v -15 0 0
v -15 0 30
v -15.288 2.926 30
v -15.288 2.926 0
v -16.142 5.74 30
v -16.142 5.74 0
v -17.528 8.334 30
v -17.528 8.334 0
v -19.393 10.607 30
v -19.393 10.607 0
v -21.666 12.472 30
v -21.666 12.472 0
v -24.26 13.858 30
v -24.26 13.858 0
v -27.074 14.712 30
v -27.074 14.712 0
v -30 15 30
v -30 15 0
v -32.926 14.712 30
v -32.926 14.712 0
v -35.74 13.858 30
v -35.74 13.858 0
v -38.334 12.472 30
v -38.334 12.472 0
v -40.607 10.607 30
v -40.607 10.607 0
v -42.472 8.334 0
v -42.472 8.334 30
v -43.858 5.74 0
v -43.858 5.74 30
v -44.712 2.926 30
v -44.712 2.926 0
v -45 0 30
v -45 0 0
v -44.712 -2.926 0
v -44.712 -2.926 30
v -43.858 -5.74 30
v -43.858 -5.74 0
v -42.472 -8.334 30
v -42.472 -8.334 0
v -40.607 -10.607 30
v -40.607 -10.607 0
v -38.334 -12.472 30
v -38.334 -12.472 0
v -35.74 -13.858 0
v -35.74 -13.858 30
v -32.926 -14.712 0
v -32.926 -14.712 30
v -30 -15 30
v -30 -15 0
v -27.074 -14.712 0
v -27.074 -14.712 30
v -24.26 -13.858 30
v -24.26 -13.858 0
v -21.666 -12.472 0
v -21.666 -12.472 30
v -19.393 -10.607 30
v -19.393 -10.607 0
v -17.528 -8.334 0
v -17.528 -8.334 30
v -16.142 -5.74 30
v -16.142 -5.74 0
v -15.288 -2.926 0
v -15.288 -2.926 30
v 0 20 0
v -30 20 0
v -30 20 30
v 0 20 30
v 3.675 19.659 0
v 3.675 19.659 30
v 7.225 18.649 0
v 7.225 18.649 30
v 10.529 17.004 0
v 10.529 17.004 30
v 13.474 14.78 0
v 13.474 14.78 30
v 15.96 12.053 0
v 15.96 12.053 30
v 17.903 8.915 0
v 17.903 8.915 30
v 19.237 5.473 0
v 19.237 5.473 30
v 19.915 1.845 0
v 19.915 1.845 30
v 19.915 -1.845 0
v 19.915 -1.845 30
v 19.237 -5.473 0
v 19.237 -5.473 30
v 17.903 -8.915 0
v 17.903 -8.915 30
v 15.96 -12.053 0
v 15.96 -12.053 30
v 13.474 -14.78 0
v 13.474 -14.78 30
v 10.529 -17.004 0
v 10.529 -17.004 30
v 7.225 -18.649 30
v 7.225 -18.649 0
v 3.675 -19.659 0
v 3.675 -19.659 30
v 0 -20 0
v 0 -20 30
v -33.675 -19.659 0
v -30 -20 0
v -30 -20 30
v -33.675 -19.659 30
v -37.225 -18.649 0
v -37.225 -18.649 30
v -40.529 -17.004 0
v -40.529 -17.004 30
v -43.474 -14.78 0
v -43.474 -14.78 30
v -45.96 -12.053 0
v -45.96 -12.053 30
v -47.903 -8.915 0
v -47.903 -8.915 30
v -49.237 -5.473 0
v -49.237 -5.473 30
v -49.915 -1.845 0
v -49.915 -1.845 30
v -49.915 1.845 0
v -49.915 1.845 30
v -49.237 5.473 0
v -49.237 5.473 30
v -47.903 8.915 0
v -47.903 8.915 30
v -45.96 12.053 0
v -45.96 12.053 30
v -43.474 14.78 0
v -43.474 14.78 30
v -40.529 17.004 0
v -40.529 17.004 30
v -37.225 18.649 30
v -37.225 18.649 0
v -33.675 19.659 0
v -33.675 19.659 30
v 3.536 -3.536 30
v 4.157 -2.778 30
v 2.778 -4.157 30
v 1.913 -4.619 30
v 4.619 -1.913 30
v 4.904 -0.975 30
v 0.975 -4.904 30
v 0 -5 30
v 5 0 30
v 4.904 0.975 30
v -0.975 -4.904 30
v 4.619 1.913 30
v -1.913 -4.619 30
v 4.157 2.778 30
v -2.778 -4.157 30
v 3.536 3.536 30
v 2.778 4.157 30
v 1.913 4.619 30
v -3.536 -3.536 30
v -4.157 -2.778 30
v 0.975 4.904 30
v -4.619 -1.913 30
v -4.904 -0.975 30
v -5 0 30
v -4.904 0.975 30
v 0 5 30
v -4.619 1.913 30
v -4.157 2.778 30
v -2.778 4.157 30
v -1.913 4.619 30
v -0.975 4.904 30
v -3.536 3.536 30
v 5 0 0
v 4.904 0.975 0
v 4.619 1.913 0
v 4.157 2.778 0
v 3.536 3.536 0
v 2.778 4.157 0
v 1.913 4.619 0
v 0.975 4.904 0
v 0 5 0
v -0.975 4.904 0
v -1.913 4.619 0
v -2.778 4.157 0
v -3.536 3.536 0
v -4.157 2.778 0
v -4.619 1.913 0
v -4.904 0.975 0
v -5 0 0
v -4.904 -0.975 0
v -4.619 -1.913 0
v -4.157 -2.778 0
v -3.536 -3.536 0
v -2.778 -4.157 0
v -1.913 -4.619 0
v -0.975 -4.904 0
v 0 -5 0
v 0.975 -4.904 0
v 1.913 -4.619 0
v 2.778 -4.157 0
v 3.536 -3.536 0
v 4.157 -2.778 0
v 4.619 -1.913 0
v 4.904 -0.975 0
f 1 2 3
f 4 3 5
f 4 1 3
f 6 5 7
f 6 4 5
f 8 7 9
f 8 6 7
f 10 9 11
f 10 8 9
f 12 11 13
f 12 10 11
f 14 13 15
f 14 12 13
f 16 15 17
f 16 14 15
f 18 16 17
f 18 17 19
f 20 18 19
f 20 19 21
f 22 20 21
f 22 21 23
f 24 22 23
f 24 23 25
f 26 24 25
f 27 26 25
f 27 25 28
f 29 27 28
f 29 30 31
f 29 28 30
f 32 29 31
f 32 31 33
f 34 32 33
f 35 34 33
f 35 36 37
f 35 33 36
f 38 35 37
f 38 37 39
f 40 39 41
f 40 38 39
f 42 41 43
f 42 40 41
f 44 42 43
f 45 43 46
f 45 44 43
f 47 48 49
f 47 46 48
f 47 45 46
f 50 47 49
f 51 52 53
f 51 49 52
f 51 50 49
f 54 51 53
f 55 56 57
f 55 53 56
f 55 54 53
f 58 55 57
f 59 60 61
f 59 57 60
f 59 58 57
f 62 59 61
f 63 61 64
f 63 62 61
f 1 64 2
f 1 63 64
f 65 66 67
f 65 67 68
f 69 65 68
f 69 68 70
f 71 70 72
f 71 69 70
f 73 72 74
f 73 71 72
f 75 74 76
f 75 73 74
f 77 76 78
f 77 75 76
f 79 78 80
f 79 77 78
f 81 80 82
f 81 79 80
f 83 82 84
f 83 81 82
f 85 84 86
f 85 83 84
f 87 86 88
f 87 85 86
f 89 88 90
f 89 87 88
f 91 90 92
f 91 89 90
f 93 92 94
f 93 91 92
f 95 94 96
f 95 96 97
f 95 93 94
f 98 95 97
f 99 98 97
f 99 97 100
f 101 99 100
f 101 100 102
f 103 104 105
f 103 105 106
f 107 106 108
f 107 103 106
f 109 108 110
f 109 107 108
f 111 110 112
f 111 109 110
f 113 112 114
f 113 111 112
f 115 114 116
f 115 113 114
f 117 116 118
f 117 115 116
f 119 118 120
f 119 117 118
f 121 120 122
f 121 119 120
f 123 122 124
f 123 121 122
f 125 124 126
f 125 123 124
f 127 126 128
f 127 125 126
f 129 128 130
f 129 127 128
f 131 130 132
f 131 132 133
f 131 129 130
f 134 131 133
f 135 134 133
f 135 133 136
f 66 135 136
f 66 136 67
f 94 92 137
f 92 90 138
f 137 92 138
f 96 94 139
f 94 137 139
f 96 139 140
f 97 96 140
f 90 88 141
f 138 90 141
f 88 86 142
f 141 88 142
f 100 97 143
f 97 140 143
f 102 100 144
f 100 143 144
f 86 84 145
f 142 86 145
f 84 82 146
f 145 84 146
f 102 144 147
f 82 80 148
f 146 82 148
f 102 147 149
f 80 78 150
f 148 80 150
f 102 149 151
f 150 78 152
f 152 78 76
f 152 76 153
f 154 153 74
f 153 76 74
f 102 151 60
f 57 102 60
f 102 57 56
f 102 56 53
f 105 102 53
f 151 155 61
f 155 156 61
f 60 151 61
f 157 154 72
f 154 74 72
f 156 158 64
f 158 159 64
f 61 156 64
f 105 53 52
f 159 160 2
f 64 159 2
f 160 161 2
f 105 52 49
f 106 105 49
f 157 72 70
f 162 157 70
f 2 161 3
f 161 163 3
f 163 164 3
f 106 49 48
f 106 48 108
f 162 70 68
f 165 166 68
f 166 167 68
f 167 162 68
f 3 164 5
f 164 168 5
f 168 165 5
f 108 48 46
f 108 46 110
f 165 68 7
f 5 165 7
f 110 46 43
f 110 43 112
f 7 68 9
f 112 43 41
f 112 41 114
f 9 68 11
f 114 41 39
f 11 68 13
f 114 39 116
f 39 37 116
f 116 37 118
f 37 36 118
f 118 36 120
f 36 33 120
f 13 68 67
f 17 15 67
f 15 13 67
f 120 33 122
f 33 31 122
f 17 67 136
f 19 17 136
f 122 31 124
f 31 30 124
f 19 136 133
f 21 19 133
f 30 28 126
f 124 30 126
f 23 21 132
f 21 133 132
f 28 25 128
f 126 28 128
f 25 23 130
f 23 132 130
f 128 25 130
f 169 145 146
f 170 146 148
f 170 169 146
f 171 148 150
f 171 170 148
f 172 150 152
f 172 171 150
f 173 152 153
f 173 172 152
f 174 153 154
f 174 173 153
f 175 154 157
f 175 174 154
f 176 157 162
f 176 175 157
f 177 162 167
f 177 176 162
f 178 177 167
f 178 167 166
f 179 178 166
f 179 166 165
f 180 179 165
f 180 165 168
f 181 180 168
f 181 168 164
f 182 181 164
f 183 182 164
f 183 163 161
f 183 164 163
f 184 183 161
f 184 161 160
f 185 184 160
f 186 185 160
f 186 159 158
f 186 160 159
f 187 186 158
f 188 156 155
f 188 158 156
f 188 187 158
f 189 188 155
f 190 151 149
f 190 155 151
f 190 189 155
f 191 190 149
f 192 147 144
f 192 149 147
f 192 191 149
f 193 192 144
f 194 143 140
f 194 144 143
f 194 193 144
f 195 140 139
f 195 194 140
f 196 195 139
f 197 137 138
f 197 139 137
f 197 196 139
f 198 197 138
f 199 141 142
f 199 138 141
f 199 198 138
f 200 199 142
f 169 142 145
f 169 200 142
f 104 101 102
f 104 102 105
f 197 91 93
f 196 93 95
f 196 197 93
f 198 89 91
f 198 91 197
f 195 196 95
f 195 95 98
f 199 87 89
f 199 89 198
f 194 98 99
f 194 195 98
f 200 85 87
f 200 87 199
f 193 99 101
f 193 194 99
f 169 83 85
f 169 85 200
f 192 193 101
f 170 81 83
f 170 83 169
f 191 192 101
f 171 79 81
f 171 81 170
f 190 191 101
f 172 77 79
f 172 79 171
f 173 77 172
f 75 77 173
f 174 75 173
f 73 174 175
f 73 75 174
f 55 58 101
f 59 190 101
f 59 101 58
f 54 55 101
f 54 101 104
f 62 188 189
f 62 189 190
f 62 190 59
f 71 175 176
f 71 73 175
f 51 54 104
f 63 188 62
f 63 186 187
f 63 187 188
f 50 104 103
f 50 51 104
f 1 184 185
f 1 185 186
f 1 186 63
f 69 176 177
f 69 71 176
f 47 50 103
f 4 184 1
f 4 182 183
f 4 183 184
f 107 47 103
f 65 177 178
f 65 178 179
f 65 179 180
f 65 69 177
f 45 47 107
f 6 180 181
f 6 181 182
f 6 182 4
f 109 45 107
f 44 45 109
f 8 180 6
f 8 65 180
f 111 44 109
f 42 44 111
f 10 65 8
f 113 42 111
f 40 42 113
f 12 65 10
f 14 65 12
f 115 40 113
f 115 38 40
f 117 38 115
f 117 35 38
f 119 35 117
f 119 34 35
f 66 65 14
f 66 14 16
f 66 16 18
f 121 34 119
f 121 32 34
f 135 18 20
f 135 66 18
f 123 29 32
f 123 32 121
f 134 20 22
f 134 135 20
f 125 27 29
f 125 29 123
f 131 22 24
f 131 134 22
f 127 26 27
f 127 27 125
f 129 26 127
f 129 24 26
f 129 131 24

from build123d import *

# Parameters (mm, degrees)
BOSS_EXTRUDE1_DEPTH = 30
SKETCH2_R           = 15
SKETCH2_R_2         = 5
CUT_EXTRUDE1_DEPTH  = 62.64414003


with BuildPart() as part:
    # Sketch1 → Boss-Extrude1 (new body)
    with BuildSketch(Plane.XY):
        with BuildLine():
            Line((-30, 20), (0, 20))
            ThreePointArc((0, 20), (20, 0), (0, -20))
            Line((0, -20), (-30, -20))
            ThreePointArc((-30, -20), (-50, 0), (-30, 20))
        make_face()
    extrude(amount=BOSS_EXTRUDE1_DEPTH)

    # Sketch2 → Cut-Extrude1 (cut, through all)
    with BuildSketch(Plane.XY):
        with Locations((-30, 0)):
            Circle(SKETCH2_R)
        Circle(SKETCH2_R_2)
    extrude(amount=CUT_EXTRUDE1_DEPTH, mode=Mode.SUBTRACT)


solid = part.part
